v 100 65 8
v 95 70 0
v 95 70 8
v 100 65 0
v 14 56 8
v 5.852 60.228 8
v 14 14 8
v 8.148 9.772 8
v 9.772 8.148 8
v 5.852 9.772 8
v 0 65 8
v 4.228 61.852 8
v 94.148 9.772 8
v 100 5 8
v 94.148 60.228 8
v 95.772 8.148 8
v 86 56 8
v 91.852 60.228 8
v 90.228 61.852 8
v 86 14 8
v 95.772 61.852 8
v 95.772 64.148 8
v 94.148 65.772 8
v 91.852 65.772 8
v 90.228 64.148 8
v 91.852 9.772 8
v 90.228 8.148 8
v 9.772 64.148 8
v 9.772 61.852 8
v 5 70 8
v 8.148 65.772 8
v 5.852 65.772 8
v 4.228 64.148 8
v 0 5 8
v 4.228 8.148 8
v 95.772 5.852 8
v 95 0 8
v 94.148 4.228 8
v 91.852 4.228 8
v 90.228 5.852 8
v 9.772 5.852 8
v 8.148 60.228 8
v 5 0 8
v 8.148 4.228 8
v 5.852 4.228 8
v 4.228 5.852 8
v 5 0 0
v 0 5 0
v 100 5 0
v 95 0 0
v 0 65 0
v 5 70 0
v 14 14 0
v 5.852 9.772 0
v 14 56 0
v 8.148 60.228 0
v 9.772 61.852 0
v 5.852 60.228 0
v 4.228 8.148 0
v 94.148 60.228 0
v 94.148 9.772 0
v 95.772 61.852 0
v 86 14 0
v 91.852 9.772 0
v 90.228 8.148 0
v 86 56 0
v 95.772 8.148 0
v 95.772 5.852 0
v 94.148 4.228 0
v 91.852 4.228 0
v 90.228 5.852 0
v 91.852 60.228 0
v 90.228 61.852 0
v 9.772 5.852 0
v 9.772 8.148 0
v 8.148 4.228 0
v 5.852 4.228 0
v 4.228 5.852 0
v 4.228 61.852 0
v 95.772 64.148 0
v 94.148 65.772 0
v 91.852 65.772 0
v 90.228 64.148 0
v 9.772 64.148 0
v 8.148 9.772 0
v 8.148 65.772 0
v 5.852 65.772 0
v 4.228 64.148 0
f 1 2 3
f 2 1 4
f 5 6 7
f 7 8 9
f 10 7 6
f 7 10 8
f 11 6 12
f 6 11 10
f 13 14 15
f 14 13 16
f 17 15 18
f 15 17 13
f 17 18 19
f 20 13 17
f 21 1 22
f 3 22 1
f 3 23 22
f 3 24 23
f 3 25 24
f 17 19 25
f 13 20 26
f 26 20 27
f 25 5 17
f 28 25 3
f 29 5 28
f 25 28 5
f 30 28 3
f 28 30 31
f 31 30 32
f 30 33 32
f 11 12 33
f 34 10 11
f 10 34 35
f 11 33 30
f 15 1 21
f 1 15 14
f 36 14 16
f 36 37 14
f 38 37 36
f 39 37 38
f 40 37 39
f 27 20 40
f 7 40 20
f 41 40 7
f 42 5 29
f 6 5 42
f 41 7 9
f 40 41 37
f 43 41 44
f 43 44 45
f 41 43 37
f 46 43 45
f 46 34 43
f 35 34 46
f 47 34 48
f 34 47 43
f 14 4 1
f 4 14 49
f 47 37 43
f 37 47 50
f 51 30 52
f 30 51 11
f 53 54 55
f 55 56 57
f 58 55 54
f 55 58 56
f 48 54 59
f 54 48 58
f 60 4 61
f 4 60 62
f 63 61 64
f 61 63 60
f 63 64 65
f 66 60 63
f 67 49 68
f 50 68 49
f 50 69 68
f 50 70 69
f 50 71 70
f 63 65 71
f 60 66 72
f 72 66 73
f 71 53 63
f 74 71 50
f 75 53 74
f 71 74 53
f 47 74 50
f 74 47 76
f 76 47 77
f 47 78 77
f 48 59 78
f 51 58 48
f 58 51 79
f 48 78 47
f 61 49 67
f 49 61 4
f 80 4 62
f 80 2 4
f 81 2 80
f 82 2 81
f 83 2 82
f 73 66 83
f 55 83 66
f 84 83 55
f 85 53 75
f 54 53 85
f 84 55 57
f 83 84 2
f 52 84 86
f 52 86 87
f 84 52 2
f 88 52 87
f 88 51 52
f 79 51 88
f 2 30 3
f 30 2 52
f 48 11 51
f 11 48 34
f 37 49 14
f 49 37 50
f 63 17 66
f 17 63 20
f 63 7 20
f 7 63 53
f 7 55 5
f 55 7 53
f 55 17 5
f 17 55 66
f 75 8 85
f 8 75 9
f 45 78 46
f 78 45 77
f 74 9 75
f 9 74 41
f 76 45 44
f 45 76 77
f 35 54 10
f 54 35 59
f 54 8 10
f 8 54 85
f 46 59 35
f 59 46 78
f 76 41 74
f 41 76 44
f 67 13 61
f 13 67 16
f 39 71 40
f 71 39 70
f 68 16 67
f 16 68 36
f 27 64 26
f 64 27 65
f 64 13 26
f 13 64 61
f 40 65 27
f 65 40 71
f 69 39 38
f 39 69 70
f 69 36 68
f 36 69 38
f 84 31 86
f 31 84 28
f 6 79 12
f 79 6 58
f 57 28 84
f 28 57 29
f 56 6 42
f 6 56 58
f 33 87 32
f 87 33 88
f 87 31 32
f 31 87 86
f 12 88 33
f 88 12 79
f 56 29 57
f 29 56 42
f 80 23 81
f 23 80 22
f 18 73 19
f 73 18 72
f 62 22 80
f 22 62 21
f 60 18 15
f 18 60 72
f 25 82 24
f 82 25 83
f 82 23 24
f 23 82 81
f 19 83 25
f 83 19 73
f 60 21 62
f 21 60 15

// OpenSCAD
$fn = 32;

// ----------------------------------------------------------------------
// Frame plate: 100 x 70 frame, 14 mm rails
// ----------------------------------------------------------------------

// --- parameters (mm) ---
plate_l = 100;            // plate length, X
plate_w = 70;             // plate width, Y
plate_t = 8;              // plate thickness, Z (extrusion height)
corner_c = 5;             // corner chamfer
frame_bar = 14;           // frame rail width
bolt_r = 3;               // corner bolt window radius
bolt_inset = 7;           // bolt centre inset from the edges

win_l = plate_l - 2 * frame_bar;  // window length
win_w = plate_w - 2 * frame_bar;  // window width
bolt_d = 2 * bolt_r;  // corner hole diameter

profile = [[5, 0], [95, 0], [100, 5], [100, 65], [95, 70], [5, 70], [0, 65], [0, 5]];  // primary outline, 8 points, counter clockwise
void_1 = [[14, 14], [86, 14], [86, 56], [14, 56]];  // the window, 4 points
void_2 = [[9.772, 8.148], [8.148, 9.772], [5.852, 9.772], [4.228, 8.148], [4.228, 5.852], [5.852, 4.228], [8.148, 4.228], [9.772, 5.852]];  // corner bolt window, 8 points
void_3 = [[95.772, 8.148], [94.148, 9.772], [91.852, 9.772], [90.228, 8.148], [90.228, 5.852], [91.852, 4.228], [94.148, 4.228], [95.772, 5.852]];  // corner bolt window, 8 points
void_4 = [[9.772, 64.148], [8.148, 65.772], [5.852, 65.772], [4.228, 64.148], [4.228, 61.852], [5.852, 60.228], [8.148, 60.228], [9.772, 61.852]];  // corner bolt window, 8 points
void_5 = [[95.772, 64.148], [94.148, 65.772], [91.852, 65.772], [90.228, 64.148], [90.228, 61.852], [91.852, 60.228], [94.148, 60.228], [95.772, 61.852]];  // corner bolt window, 8 points

// --- the one profile operation ---
difference() {
  linear_extrude(height = plate_t) polygon(points = profile);
  translate([0, 0, -1])
    linear_extrude(height = plate_t + 2) polygon(points = void_1);
  translate([0, 0, -1])
    linear_extrude(height = plate_t + 2) polygon(points = void_2);
  translate([0, 0, -1])
    linear_extrude(height = plate_t + 2) polygon(points = void_3);
  translate([0, 0, -1])
    linear_extrude(height = plate_t + 2) polygon(points = void_4);
  translate([0, 0, -1])
    linear_extrude(height = plate_t + 2) polygon(points = void_5);
}
